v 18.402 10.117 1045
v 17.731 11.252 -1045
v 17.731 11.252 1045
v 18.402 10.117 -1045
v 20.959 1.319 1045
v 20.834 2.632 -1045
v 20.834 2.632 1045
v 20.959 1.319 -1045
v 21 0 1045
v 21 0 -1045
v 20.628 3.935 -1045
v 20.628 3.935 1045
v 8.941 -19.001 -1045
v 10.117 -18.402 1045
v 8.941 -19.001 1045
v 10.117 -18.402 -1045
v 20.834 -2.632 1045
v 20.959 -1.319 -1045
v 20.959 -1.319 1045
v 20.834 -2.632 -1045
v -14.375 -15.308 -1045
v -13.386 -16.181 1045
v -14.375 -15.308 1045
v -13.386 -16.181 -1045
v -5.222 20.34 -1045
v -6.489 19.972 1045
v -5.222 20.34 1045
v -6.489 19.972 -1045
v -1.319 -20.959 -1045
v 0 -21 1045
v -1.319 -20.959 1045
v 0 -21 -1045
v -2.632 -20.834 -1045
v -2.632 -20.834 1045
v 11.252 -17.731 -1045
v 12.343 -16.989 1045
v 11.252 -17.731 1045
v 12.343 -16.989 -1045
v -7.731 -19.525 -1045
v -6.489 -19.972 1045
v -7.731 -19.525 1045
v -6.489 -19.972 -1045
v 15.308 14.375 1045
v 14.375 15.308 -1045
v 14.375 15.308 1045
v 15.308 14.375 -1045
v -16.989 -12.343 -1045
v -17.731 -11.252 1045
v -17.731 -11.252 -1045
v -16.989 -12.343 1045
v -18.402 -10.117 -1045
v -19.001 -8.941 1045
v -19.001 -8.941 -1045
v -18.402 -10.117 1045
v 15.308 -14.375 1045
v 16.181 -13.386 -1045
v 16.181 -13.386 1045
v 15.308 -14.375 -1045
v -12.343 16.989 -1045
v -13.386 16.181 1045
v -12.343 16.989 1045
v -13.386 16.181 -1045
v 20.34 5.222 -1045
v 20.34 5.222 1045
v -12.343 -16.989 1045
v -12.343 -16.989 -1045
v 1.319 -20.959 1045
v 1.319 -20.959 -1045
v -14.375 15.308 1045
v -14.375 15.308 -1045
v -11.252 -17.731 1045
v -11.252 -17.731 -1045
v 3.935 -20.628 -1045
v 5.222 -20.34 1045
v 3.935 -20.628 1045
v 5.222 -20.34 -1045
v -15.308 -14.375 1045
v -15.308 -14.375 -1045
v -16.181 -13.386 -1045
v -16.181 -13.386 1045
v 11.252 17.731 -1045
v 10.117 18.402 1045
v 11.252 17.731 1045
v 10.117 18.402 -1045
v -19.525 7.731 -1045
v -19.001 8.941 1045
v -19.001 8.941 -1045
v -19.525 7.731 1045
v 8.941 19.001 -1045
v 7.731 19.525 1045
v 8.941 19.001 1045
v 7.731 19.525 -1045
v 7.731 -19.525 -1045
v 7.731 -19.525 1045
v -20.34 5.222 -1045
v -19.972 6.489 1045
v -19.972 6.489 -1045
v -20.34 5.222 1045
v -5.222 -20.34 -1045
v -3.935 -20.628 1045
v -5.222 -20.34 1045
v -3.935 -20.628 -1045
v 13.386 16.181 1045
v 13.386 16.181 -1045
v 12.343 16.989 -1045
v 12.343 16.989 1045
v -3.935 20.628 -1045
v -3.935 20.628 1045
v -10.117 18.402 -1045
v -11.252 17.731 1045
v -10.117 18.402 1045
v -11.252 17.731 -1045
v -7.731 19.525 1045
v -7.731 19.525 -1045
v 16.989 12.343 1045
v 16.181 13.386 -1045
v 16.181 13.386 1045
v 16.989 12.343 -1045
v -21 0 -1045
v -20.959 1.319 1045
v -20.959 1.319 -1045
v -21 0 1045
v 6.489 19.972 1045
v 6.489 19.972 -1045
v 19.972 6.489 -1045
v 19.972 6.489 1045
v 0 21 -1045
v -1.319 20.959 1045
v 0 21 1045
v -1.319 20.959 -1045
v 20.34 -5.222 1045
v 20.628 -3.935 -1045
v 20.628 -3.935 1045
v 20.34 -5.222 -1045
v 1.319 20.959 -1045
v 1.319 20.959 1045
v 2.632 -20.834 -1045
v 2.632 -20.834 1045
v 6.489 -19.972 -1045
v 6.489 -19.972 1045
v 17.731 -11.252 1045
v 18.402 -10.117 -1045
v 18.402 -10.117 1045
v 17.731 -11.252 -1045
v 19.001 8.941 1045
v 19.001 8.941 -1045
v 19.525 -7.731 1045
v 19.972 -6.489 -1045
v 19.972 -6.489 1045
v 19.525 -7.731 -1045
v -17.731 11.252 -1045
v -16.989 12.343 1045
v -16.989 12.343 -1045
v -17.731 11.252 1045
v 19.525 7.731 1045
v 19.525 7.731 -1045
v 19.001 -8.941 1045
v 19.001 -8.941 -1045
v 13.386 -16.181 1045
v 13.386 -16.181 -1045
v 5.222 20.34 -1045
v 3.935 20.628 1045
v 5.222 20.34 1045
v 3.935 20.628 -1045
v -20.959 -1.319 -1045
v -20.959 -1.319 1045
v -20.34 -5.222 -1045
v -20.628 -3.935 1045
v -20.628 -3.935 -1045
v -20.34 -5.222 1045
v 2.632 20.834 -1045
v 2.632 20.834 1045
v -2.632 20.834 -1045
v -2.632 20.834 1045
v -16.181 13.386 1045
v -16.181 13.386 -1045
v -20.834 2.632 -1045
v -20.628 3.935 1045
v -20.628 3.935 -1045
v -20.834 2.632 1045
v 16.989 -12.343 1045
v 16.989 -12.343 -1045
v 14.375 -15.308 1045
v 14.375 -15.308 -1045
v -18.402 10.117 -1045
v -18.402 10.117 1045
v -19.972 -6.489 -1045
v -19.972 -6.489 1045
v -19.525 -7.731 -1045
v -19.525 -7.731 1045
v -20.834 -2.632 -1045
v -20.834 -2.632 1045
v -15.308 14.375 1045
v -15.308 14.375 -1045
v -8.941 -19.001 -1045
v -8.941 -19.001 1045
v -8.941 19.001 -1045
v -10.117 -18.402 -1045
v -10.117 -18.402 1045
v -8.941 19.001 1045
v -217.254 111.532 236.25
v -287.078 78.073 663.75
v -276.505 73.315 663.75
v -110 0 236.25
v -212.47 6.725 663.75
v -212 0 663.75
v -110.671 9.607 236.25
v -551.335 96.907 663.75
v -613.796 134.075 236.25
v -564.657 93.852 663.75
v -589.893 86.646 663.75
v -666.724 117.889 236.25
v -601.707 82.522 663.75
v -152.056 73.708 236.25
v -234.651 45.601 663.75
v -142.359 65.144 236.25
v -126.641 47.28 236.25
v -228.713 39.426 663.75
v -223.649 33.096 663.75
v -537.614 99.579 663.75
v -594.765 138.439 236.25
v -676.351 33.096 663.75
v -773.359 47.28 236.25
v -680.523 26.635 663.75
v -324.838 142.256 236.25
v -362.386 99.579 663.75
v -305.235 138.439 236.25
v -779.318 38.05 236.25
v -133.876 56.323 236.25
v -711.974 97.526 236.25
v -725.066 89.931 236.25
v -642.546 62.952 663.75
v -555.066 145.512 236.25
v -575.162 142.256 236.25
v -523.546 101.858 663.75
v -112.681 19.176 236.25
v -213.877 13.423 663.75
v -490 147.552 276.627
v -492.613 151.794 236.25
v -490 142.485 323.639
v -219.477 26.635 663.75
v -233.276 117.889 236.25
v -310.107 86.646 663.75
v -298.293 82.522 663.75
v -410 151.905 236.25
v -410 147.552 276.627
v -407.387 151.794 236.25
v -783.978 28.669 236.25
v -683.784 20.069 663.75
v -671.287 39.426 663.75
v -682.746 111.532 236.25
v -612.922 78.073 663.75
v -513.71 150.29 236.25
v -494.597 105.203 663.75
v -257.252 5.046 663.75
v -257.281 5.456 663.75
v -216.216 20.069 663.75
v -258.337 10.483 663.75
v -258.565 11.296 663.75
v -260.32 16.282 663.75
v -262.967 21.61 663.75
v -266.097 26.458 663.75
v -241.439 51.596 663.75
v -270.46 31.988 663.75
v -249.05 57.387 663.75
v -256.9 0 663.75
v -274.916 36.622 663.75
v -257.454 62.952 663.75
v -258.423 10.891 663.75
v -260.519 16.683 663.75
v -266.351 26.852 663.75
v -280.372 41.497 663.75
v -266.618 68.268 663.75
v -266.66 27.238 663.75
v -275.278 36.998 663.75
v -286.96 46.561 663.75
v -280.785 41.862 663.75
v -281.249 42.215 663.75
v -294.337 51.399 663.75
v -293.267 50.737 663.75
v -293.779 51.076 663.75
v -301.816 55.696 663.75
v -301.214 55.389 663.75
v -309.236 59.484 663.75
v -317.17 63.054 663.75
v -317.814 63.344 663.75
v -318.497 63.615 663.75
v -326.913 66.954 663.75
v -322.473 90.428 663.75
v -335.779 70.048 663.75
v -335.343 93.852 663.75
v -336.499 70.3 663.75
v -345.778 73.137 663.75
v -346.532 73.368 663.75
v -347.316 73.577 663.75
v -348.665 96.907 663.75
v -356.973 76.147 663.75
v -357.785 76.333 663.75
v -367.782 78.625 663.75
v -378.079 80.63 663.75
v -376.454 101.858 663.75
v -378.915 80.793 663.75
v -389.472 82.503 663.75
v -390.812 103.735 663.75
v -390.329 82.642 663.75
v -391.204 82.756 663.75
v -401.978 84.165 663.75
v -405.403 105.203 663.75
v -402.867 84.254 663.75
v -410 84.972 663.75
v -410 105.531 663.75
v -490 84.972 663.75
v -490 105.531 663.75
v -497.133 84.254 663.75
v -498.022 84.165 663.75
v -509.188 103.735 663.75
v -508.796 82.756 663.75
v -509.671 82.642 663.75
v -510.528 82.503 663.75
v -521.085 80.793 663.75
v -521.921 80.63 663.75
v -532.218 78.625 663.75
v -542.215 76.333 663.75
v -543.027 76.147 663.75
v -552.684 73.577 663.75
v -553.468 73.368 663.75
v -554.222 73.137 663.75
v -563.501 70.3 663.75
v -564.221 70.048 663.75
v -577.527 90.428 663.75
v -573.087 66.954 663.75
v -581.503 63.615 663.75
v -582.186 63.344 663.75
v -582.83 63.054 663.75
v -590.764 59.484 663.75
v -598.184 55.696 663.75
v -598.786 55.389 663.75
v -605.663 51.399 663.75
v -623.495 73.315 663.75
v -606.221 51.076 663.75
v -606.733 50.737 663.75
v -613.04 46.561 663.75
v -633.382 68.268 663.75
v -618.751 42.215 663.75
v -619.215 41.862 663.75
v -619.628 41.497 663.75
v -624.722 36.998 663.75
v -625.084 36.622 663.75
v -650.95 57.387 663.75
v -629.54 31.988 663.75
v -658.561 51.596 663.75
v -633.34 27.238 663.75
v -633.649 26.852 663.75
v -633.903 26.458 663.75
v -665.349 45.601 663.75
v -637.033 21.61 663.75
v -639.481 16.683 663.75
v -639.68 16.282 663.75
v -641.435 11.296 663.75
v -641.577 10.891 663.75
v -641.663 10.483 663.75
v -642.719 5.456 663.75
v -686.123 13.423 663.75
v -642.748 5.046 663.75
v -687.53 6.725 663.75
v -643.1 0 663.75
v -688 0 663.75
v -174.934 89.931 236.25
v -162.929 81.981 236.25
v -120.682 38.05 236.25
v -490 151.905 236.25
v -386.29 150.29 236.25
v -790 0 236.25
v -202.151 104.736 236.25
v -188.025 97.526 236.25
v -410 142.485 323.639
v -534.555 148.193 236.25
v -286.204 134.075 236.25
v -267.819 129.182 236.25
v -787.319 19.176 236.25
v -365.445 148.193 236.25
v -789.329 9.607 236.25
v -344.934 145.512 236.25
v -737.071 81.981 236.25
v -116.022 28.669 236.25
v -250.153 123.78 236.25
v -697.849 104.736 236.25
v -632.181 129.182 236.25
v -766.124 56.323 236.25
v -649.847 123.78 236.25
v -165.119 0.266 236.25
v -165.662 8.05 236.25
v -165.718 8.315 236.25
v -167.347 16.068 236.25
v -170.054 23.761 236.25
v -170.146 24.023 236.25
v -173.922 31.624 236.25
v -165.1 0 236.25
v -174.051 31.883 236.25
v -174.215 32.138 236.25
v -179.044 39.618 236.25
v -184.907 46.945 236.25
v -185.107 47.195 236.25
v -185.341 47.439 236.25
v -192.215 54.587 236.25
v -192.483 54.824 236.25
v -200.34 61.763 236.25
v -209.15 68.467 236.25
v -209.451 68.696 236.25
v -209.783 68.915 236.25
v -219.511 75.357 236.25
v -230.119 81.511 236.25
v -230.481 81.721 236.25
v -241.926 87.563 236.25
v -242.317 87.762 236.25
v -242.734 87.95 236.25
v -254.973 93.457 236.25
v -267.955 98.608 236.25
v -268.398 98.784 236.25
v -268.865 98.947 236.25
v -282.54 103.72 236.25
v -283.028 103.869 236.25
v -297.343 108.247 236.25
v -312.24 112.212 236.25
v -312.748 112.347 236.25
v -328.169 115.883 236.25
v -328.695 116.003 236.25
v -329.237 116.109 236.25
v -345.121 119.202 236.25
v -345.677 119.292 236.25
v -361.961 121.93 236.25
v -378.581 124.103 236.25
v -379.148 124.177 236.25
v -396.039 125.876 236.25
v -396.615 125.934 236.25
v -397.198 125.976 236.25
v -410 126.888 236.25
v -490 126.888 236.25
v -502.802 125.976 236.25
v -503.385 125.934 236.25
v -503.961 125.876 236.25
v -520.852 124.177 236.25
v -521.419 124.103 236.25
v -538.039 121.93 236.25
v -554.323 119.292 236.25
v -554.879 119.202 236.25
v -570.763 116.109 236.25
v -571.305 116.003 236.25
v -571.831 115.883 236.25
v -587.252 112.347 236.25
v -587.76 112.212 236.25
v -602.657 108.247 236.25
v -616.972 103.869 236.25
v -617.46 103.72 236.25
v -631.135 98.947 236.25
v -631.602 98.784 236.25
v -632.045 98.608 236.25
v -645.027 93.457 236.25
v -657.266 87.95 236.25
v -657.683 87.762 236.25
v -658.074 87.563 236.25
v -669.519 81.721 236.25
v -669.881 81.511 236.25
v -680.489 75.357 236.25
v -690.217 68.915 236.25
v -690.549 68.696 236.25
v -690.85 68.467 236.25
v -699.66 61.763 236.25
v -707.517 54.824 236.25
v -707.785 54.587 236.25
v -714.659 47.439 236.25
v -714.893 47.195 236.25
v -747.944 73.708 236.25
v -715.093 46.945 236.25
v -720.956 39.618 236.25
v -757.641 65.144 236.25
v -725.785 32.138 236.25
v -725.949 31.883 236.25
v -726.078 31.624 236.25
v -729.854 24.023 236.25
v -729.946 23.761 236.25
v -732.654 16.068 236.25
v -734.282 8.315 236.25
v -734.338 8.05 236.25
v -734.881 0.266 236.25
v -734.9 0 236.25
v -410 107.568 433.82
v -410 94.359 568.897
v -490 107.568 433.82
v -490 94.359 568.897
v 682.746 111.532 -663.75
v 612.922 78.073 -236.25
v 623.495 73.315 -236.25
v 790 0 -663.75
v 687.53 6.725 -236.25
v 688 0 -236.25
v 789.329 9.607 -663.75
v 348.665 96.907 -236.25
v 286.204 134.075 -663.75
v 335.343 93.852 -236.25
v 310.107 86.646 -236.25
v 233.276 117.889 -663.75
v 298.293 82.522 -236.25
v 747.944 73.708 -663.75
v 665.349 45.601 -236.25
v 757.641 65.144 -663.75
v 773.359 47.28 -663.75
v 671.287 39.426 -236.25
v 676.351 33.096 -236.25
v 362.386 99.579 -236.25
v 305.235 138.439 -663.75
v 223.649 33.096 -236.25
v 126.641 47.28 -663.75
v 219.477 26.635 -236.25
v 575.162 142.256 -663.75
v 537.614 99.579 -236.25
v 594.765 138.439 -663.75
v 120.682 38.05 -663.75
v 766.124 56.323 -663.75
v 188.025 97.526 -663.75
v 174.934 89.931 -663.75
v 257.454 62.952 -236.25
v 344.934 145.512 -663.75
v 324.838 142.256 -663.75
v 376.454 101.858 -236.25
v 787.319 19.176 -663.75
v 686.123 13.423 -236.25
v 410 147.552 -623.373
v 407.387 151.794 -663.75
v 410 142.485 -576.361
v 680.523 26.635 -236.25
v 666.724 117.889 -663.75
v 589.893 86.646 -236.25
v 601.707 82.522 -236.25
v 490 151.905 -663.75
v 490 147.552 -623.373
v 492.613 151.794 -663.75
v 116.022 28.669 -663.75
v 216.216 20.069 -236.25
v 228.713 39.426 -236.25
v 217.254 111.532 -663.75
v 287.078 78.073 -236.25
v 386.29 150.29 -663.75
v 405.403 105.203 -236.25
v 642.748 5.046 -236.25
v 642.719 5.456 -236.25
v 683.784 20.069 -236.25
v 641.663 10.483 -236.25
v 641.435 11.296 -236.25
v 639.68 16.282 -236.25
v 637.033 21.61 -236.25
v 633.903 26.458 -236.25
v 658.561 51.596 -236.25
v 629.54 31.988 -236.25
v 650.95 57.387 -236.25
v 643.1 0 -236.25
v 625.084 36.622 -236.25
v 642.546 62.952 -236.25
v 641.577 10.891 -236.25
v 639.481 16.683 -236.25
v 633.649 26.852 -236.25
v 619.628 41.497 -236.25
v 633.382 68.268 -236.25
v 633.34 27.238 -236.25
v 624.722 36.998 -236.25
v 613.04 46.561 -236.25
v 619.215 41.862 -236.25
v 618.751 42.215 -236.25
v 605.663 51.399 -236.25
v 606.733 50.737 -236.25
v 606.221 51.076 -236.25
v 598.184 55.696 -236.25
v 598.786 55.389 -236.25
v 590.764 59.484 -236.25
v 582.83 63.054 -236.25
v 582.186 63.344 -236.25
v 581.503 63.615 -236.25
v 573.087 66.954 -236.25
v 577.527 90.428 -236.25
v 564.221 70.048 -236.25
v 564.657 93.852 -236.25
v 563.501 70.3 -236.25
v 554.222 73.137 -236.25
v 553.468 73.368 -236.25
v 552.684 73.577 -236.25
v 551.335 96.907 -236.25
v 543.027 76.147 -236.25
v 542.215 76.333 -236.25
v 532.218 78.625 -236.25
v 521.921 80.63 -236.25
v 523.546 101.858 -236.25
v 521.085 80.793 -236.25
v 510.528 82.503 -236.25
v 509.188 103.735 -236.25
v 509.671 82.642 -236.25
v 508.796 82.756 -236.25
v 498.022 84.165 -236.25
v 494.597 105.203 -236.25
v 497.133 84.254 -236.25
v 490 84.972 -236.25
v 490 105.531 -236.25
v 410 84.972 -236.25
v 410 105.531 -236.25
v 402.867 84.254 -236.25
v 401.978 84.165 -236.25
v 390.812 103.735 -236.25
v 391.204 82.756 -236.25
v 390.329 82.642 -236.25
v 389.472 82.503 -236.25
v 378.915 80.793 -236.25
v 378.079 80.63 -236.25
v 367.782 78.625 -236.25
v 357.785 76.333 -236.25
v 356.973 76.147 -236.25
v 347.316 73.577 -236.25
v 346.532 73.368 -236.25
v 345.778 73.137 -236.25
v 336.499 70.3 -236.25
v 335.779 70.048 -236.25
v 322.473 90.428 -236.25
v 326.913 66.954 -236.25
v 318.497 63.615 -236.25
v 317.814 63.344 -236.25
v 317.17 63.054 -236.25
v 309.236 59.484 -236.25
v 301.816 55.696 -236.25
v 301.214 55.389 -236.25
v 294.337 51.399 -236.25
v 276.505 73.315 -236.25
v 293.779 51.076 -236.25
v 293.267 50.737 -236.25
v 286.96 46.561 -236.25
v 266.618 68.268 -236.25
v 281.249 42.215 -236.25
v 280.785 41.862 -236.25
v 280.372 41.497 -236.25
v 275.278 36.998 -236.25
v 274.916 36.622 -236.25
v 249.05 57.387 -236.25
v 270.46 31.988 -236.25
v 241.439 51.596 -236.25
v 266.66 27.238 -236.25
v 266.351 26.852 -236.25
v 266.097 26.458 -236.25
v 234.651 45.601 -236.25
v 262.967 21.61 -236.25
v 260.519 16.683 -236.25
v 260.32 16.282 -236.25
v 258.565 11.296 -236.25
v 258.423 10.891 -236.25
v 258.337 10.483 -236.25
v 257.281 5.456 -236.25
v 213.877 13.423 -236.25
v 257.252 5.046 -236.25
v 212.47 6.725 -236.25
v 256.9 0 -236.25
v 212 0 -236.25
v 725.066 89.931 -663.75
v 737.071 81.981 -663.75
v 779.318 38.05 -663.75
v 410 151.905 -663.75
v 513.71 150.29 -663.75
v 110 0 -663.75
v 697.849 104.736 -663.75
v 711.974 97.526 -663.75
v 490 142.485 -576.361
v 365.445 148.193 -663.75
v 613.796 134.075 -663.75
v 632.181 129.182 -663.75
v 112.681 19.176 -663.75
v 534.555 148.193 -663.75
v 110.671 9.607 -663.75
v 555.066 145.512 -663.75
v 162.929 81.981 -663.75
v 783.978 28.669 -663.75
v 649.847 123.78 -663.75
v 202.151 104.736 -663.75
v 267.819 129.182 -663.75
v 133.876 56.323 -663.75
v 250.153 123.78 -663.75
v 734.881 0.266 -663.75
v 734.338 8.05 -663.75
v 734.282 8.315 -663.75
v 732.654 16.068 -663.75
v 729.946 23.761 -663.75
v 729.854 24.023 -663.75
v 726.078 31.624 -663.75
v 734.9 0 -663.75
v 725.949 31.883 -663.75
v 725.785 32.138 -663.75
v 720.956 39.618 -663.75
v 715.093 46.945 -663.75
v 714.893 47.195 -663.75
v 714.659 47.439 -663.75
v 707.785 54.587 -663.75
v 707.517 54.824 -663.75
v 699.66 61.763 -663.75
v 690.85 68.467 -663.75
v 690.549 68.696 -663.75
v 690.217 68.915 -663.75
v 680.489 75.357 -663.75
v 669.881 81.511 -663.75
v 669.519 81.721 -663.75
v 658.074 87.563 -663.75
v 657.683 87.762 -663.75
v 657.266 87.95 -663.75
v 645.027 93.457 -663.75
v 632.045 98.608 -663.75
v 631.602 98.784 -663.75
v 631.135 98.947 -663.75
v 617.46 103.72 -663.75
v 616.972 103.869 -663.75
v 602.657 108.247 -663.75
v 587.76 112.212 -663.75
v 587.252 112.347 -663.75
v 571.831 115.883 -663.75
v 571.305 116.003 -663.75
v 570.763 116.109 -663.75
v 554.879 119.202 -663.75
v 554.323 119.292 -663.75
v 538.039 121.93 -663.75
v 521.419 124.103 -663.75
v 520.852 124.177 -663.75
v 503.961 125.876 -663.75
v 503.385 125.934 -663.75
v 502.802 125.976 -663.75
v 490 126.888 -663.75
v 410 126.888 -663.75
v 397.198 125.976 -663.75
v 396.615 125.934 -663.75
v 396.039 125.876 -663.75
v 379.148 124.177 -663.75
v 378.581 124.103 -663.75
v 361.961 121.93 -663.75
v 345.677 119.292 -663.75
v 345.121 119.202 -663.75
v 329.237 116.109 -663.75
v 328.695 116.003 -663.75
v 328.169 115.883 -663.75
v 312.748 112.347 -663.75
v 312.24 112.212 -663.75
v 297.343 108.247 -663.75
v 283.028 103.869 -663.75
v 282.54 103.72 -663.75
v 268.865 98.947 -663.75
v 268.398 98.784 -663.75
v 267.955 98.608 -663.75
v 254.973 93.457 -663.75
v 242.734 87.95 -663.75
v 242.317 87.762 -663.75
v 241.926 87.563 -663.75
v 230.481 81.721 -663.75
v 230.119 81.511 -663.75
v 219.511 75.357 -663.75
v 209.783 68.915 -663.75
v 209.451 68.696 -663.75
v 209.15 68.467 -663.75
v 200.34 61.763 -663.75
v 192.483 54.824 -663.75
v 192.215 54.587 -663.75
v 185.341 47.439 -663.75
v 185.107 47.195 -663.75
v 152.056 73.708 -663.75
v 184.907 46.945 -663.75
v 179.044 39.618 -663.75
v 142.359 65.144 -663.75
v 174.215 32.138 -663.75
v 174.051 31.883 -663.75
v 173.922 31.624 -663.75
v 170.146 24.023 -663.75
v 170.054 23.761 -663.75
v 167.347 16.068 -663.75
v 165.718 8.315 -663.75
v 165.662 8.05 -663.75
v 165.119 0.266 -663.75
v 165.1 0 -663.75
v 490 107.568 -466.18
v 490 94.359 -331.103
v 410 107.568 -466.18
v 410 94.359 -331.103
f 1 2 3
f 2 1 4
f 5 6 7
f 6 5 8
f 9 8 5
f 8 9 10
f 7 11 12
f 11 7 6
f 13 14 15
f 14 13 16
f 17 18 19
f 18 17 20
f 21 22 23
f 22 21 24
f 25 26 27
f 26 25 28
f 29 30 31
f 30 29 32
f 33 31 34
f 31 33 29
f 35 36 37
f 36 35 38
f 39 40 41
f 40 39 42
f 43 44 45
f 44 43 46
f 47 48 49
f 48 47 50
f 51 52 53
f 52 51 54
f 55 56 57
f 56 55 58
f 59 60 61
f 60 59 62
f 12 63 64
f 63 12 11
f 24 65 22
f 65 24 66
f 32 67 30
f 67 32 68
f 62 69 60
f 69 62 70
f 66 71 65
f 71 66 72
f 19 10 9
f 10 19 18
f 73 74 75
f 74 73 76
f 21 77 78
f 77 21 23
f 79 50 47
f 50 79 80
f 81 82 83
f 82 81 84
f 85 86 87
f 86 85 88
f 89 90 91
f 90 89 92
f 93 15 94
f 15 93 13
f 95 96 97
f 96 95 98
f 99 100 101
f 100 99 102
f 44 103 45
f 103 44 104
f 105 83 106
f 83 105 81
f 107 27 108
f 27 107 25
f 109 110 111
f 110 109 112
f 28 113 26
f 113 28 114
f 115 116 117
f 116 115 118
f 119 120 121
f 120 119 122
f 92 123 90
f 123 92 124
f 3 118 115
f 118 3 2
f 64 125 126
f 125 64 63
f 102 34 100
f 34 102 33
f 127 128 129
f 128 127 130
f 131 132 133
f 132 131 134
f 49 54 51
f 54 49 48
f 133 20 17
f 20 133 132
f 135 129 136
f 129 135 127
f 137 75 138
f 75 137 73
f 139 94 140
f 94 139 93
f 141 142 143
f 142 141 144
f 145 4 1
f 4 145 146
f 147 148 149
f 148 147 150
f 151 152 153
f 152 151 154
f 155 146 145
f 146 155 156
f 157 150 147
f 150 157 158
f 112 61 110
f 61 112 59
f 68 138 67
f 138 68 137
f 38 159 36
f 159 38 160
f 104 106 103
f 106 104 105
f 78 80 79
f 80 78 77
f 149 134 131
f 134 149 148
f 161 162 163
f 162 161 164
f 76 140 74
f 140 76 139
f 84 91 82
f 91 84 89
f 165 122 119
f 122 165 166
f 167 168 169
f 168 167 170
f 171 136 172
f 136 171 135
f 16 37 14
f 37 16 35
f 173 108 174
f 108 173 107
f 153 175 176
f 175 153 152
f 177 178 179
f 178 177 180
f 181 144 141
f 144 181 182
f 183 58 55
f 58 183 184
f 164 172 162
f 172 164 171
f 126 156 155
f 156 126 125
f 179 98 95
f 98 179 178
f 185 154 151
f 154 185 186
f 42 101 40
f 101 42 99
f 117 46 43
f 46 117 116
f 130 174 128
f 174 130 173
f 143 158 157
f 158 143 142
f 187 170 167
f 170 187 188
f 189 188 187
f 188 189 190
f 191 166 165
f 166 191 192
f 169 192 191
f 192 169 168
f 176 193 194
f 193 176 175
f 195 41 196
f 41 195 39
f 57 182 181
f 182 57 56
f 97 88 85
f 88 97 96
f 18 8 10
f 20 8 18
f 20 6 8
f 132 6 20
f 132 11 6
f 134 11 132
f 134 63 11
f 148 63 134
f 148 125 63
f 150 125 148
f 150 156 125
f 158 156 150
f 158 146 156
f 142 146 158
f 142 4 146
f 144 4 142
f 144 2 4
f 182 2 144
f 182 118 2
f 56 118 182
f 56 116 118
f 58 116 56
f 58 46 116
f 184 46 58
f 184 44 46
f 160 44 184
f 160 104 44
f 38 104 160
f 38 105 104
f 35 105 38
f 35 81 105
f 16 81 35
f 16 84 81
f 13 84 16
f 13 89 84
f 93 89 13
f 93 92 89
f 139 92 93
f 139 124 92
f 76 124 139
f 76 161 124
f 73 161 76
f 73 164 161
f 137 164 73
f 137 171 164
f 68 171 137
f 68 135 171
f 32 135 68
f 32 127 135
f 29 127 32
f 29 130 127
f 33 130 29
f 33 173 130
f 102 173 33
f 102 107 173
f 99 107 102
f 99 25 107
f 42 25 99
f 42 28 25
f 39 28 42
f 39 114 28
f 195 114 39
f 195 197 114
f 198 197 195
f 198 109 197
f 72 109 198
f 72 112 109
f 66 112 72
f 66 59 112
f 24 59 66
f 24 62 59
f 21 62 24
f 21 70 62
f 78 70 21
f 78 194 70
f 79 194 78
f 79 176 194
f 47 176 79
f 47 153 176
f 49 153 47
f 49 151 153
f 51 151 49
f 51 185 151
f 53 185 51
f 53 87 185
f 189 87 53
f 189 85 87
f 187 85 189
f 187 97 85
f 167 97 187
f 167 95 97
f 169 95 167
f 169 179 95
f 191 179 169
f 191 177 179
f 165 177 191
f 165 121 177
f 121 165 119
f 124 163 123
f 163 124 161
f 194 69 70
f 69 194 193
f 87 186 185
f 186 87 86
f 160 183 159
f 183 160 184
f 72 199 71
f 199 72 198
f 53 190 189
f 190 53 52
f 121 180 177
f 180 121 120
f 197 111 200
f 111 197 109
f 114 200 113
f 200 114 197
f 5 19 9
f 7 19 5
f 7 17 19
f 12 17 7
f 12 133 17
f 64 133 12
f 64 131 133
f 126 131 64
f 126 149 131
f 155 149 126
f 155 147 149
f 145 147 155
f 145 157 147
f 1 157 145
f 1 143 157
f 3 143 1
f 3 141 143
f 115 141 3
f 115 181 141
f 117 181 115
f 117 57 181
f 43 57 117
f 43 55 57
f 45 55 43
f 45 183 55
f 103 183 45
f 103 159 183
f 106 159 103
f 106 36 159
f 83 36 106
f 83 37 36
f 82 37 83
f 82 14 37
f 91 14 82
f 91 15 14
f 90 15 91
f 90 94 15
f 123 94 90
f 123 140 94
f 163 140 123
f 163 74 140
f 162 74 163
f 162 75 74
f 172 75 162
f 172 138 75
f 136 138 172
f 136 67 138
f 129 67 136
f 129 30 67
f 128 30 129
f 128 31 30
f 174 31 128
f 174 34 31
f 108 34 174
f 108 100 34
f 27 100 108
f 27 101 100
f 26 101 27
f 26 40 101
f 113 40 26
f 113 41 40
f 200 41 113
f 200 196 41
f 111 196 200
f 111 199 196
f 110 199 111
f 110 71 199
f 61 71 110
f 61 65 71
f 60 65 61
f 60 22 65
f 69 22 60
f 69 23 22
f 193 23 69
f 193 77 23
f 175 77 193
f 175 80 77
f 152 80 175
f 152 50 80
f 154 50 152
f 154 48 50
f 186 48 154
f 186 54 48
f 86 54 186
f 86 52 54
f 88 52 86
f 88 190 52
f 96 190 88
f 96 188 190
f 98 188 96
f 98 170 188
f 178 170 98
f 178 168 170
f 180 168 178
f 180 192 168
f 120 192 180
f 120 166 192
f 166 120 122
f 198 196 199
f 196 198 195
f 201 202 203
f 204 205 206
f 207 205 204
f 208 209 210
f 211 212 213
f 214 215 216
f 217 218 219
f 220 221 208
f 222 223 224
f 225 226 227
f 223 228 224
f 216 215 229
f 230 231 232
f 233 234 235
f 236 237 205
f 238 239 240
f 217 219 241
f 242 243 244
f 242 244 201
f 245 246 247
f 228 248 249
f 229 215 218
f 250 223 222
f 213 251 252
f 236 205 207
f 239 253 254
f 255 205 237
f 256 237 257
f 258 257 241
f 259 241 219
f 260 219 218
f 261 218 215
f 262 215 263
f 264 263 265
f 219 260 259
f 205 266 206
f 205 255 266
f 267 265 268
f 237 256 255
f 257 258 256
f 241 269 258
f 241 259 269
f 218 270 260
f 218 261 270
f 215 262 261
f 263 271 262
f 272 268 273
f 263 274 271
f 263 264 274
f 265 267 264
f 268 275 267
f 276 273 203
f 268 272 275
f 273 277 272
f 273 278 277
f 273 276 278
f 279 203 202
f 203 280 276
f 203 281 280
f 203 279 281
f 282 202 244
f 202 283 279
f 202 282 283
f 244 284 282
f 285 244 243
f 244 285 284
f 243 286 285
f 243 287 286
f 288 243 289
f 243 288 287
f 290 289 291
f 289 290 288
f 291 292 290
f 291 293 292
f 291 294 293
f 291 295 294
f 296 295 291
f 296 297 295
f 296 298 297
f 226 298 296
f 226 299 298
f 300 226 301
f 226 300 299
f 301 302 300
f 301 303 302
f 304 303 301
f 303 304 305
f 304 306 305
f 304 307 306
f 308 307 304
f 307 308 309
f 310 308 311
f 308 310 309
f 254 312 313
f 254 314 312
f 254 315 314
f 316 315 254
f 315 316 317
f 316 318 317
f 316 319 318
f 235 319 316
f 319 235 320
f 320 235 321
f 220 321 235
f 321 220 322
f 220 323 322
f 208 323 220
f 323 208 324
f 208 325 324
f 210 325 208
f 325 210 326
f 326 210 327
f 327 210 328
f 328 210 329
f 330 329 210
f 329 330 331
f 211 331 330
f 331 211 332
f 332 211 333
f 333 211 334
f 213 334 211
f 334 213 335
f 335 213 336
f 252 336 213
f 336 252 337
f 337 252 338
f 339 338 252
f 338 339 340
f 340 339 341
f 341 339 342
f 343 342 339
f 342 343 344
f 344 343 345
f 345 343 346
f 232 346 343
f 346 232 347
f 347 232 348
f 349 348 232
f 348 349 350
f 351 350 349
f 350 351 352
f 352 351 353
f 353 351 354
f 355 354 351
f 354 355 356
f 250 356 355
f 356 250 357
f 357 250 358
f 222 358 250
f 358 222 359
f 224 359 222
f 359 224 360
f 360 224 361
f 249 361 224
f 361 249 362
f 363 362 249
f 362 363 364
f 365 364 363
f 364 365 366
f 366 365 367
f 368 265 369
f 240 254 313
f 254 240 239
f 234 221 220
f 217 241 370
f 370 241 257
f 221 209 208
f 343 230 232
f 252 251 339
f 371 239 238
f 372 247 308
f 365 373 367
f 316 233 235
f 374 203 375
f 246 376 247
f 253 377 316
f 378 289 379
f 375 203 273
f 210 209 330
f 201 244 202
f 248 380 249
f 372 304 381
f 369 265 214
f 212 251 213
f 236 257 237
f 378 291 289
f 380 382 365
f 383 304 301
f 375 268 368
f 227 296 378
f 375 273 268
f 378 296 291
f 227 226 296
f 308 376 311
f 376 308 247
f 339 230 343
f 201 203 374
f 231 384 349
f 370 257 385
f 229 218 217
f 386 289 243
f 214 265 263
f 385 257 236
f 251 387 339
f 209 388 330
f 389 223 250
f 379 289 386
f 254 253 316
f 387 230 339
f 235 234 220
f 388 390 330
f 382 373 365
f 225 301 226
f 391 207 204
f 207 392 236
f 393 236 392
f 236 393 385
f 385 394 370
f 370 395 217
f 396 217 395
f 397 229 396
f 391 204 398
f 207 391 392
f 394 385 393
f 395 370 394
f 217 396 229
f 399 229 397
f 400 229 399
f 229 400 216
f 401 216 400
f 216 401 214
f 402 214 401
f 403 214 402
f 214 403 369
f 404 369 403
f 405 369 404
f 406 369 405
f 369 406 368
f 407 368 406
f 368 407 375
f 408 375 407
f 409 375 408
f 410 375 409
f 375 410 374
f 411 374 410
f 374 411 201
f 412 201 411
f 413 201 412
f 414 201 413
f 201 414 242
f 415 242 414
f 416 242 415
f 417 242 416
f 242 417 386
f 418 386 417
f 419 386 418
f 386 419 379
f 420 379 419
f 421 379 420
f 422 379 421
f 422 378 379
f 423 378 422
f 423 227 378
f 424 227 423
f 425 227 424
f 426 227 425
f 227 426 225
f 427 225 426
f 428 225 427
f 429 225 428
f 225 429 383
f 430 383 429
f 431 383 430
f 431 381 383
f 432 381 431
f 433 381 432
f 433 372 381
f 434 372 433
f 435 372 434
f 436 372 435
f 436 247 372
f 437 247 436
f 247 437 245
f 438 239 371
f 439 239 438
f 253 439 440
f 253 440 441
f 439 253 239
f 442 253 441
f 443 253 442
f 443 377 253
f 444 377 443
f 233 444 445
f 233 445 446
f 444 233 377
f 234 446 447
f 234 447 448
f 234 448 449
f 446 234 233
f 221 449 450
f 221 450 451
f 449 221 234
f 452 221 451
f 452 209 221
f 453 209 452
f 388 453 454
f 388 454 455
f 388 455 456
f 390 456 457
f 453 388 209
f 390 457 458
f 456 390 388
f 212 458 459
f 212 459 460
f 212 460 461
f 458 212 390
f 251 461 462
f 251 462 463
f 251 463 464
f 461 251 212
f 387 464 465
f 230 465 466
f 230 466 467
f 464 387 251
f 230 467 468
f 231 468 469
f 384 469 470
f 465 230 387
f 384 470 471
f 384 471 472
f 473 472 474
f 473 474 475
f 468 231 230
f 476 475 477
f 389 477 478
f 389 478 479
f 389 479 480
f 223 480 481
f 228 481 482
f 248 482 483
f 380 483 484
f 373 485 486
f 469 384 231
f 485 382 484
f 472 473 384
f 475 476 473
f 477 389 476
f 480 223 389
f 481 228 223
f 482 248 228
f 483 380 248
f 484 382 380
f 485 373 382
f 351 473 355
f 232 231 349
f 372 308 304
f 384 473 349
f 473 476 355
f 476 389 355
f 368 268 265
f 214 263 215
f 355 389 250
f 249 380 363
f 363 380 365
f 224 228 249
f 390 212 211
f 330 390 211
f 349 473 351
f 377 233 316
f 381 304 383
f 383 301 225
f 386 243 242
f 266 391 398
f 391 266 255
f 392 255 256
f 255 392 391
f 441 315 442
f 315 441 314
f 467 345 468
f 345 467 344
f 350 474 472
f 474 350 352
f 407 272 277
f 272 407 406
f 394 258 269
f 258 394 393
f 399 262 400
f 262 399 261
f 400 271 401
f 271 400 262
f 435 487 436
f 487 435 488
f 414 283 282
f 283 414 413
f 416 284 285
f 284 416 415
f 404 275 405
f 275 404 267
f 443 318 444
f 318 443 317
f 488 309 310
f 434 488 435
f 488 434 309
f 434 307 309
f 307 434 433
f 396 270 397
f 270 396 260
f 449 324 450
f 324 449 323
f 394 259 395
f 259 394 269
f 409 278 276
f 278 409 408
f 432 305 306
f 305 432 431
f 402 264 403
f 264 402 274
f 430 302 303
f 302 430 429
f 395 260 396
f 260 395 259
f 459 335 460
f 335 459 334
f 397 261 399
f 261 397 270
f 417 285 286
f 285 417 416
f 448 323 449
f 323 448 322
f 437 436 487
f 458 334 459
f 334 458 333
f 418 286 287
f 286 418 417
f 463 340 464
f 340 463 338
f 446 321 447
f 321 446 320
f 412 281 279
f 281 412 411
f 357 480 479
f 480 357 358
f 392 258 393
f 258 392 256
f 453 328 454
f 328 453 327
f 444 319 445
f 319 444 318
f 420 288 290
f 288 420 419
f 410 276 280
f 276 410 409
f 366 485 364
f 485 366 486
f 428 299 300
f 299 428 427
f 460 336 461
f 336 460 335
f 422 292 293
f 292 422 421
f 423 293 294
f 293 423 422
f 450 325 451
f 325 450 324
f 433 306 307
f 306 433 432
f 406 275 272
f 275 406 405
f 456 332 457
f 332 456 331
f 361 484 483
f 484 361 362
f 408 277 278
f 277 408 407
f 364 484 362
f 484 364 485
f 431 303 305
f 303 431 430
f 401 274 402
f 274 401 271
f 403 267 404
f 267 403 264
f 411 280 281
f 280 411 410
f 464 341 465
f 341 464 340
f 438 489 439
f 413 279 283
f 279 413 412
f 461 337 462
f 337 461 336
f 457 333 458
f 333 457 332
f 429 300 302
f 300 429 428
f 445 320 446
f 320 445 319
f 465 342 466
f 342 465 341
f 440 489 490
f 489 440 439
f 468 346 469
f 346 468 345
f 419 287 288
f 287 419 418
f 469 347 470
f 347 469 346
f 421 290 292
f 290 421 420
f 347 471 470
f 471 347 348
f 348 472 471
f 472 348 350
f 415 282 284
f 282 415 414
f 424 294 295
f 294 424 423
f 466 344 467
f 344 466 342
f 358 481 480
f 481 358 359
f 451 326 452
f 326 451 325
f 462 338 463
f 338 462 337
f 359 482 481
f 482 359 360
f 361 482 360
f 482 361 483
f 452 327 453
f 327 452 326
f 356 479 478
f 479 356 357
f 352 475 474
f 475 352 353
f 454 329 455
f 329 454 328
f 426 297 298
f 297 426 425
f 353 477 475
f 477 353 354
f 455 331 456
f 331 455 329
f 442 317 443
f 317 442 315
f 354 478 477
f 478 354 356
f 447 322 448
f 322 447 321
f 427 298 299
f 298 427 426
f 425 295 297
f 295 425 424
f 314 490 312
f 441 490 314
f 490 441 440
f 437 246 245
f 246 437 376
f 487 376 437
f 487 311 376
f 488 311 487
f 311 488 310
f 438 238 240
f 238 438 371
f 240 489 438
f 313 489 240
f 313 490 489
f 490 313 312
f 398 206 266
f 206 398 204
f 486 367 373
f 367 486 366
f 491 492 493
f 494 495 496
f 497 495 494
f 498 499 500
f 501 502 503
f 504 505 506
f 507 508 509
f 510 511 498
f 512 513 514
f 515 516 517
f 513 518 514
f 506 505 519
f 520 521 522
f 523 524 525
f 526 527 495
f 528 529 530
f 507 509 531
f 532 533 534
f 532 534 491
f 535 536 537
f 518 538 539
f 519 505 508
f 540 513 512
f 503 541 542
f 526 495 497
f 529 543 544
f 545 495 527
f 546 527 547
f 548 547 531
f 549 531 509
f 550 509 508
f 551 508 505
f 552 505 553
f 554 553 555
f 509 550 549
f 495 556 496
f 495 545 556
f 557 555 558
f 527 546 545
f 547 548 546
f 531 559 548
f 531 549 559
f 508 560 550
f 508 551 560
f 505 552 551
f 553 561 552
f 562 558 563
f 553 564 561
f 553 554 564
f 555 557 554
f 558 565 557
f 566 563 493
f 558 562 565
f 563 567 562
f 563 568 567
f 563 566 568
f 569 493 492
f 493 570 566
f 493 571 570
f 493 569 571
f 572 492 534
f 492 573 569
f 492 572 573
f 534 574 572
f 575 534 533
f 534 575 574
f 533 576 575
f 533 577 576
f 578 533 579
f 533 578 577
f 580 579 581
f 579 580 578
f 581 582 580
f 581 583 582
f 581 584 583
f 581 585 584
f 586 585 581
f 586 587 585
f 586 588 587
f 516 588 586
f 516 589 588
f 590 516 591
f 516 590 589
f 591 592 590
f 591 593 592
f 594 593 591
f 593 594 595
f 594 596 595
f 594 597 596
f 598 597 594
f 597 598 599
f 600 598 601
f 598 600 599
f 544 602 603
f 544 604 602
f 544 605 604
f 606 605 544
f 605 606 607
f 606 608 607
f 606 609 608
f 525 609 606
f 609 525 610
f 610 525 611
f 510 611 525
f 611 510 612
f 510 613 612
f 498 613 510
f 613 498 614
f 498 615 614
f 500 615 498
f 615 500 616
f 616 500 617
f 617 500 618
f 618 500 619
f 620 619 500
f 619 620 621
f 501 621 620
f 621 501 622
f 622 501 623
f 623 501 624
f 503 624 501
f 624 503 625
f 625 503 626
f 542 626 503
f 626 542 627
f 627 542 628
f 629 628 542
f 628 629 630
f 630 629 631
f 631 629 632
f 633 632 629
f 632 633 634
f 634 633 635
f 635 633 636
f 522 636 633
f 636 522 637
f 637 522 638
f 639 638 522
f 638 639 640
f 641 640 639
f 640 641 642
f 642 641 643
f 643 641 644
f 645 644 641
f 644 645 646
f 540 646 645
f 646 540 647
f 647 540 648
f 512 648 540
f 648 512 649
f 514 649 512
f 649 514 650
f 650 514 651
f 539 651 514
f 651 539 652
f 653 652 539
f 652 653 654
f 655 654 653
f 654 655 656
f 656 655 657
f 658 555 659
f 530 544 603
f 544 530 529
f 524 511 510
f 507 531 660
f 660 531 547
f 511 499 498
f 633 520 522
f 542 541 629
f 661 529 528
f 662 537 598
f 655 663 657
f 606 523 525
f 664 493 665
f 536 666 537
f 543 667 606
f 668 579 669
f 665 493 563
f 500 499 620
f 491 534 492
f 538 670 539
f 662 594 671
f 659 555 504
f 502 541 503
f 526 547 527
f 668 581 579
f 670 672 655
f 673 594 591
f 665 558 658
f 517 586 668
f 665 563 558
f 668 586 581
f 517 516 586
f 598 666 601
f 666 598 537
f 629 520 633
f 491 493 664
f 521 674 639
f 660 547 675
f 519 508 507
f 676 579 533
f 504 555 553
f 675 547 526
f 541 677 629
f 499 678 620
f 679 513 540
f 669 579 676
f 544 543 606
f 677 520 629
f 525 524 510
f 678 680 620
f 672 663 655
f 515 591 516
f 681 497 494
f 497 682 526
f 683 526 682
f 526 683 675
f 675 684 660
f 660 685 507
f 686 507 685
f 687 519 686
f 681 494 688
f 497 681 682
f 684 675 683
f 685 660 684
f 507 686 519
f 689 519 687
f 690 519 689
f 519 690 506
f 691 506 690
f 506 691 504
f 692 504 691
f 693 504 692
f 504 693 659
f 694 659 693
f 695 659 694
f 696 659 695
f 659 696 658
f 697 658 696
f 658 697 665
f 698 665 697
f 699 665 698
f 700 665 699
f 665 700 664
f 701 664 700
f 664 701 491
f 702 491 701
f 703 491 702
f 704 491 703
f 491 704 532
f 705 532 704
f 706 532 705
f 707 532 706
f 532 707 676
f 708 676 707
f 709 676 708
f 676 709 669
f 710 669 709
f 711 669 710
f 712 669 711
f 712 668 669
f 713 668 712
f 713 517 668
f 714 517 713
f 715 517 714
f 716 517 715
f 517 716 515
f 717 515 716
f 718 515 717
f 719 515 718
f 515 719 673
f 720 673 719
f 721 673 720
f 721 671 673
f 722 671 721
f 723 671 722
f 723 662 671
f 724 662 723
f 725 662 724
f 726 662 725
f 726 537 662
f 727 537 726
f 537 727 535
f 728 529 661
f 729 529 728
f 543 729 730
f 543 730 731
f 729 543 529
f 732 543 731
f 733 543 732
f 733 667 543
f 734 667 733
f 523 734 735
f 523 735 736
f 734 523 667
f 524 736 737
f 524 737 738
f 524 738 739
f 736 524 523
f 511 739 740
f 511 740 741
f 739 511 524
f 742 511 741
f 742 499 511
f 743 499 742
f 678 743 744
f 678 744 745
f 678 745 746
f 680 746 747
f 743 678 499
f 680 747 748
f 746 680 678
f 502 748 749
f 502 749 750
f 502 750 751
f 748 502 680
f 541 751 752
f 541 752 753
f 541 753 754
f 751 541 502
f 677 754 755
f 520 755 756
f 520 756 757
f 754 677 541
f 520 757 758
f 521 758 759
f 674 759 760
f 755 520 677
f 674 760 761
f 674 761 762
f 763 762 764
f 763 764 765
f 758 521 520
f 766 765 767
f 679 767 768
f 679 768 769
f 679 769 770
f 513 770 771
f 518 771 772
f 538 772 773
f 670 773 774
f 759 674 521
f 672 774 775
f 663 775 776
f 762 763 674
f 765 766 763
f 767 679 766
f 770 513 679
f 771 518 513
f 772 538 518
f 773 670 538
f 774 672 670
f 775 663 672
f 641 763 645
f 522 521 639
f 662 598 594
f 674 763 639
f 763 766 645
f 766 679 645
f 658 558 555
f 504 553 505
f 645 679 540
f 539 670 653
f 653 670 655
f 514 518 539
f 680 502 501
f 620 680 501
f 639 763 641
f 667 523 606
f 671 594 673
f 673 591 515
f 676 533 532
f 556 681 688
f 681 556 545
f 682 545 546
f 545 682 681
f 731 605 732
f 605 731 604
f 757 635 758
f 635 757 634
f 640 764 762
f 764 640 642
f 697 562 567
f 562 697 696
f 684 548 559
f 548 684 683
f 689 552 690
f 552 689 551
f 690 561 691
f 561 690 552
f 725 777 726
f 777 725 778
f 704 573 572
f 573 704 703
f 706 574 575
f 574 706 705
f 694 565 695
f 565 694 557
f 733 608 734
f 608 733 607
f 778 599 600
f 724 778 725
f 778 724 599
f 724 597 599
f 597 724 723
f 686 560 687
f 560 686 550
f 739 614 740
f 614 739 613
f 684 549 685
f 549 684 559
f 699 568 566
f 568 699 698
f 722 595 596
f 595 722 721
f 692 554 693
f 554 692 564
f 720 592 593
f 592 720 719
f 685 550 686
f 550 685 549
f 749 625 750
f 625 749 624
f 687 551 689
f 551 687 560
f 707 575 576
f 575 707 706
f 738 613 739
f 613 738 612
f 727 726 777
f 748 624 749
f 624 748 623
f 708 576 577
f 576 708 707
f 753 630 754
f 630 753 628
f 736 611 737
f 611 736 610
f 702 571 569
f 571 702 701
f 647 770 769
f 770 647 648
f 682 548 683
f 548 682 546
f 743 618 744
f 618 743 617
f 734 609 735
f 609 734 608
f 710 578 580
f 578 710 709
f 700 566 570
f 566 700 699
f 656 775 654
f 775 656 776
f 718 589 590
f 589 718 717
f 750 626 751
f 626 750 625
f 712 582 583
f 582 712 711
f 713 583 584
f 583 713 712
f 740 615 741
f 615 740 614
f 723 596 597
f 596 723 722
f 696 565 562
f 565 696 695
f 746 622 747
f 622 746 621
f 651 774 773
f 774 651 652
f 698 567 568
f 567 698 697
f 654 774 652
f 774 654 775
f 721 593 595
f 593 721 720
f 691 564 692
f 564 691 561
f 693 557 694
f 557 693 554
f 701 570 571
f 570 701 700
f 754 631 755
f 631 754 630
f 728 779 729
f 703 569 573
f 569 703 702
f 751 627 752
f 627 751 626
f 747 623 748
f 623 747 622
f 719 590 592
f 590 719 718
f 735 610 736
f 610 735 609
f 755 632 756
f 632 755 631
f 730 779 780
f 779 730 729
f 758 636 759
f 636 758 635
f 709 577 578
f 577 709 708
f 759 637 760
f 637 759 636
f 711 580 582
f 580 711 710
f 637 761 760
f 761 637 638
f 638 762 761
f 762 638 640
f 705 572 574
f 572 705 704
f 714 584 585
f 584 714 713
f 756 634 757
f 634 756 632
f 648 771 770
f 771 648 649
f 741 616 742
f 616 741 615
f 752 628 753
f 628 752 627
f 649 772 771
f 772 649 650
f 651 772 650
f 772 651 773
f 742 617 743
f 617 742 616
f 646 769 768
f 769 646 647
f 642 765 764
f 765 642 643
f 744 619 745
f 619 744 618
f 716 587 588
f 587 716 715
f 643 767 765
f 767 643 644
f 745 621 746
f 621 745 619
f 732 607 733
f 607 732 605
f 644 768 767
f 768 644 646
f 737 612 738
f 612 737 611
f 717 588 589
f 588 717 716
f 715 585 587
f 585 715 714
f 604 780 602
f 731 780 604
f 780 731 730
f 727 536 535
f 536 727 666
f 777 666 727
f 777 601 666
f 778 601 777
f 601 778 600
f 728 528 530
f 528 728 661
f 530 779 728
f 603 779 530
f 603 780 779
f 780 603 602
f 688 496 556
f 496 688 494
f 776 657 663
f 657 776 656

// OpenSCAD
// ============================================================================
// PROJECT: XXXG-00W0 WING GUNDAM ZERO EW - LOWER CHASSIS PROTECTION
// COMPONENT VAULT: BANDAI CAST RUNNER F - ANKLE SHIELDS F20 & F21
// MANUFACTURING SPEC: WIRELESS INDUCTIVE HARNESS PROXIMITY TERMINALS
// DESIGN SPECS: 5,200 Nm RECOIL COMPLIANCE & DLC LOW-FRICTION SLIDERS
// ============================================================================

$fn = 100; // Circular segment rendering resolution count

// Structural Constants Scaled 1:1 for a 16.7-Meter Airframe Scale (mm)
ankle_cap_length = 950;                 // Total longitudinal vertical span (mm)
ankle_outer_width = 680;                // Transverse armor plate envelope width (mm)
armor_skin_thickness = 50;              // Solid TiAl protective plating wall (mm)
harness_conduit_width = 80;             // Cast-in 4oz copper logic trace track (mm)

module Runner_F_Ankle_Cap_Forge() {
    // Central Supply Injection Runner Axis (Molten Feed Line from Siphon Forge)
    color([0.24, 0.24, 0.26]) {
        cylinder(h = ankle_cap_length * 2.2, d = 42, center = true);
        // Direct injection gates tracking straight into the part mold cavities
        translate() rotate() cylinder(h = 450, d = 22);
        translate([0, 0, -450]) rotate() cylinder(h = 450, d = 22);
    }
    
    // Instantiate Scaled Skeutomorphic Part Molds Symmetrically
    Cast_Outer_Ankle_Armor();
}

module Cast_Outer_Ankle_Armor() {
    // ---- PART F20: OUTER LEFT ANKLE DEFENSE COWL SHELL ---- [Page 6, Step 2]
    translate([-450, 0, 450]) color([0.85, 0.85, 0.9]) { // Classic White Armor Spec
        difference() {
            // Main tapered external protective ankle shield panel
            scale([1.0, 0.45, 1.0])
                cylinder(h = ankle_cap_length * 0.45, r1 = ankle_outer_width * 0.5, r2 = ankle_outer_width * 0.35, center = true);
            
            // Internal pocket excavation (Leaves the rigid 50mm protective wall)
            scale([1.0, 0.45, 1.0])
                cylinder(h = ankle_cap_length * 0.5, r1 = (ankle_outer_width * 0.5) - armor_skin_thickness, r2 = (ankle_outer_width * 0.35) - armor_skin_thickness, center = true);
                
            // Continuous cast-in routing track for the 4oz solid-state wiring rails
            cube([harness_conduit_width, ankle_outer_width * 2, ankle_cap_length], center = true);
            
            // Slicing profile tool to generate an asymmetrical half-shell part component
            translate([0, -ankle_outer_width, 0])
                cube([ankle_outer_width * 2, ankle_outer_width * 2, ankle_cap_length * 2], center = true);
        }
    }
    
    // ---- PART F21: OUTER RIGHT ANKLE DEFENSE COWL SHELL ---- [Page 6, Step 1]
    translate([450, 0, -450]) rotate() color([0.85, 0.85, 0.9]) {
        difference() {
            scale([1.0, 0.45, 1.0])
                cylinder(h = ankle_cap_length * 0.45, r1 = ankle_outer_width * 0.5, r2 = ankle_outer_width * 0.35, center = true);
            scale([1.0, 0.45, 1.0])
                cylinder(h = ankle_cap_length * 0.5, r1 = (ankle_outer_width * 0.5) - armor_skin_thickness, r2 = (ankle_outer_width * 0.35) - armor_skin_thickness, center = true);
            cube([harness_conduit_width, ankle_outer_width * 2, ankle_cap_length], center = true);
            translate([0, -ankle_outer_width, 0])
                cube([ankle_outer_width * 2, ankle_outer_width * 2, ankle_cap_length * 2], center = true);
        }
    }
}

// Render Master Assembly to Parameter Workspace
Runner_F_Ankle_Cap_Forge();
